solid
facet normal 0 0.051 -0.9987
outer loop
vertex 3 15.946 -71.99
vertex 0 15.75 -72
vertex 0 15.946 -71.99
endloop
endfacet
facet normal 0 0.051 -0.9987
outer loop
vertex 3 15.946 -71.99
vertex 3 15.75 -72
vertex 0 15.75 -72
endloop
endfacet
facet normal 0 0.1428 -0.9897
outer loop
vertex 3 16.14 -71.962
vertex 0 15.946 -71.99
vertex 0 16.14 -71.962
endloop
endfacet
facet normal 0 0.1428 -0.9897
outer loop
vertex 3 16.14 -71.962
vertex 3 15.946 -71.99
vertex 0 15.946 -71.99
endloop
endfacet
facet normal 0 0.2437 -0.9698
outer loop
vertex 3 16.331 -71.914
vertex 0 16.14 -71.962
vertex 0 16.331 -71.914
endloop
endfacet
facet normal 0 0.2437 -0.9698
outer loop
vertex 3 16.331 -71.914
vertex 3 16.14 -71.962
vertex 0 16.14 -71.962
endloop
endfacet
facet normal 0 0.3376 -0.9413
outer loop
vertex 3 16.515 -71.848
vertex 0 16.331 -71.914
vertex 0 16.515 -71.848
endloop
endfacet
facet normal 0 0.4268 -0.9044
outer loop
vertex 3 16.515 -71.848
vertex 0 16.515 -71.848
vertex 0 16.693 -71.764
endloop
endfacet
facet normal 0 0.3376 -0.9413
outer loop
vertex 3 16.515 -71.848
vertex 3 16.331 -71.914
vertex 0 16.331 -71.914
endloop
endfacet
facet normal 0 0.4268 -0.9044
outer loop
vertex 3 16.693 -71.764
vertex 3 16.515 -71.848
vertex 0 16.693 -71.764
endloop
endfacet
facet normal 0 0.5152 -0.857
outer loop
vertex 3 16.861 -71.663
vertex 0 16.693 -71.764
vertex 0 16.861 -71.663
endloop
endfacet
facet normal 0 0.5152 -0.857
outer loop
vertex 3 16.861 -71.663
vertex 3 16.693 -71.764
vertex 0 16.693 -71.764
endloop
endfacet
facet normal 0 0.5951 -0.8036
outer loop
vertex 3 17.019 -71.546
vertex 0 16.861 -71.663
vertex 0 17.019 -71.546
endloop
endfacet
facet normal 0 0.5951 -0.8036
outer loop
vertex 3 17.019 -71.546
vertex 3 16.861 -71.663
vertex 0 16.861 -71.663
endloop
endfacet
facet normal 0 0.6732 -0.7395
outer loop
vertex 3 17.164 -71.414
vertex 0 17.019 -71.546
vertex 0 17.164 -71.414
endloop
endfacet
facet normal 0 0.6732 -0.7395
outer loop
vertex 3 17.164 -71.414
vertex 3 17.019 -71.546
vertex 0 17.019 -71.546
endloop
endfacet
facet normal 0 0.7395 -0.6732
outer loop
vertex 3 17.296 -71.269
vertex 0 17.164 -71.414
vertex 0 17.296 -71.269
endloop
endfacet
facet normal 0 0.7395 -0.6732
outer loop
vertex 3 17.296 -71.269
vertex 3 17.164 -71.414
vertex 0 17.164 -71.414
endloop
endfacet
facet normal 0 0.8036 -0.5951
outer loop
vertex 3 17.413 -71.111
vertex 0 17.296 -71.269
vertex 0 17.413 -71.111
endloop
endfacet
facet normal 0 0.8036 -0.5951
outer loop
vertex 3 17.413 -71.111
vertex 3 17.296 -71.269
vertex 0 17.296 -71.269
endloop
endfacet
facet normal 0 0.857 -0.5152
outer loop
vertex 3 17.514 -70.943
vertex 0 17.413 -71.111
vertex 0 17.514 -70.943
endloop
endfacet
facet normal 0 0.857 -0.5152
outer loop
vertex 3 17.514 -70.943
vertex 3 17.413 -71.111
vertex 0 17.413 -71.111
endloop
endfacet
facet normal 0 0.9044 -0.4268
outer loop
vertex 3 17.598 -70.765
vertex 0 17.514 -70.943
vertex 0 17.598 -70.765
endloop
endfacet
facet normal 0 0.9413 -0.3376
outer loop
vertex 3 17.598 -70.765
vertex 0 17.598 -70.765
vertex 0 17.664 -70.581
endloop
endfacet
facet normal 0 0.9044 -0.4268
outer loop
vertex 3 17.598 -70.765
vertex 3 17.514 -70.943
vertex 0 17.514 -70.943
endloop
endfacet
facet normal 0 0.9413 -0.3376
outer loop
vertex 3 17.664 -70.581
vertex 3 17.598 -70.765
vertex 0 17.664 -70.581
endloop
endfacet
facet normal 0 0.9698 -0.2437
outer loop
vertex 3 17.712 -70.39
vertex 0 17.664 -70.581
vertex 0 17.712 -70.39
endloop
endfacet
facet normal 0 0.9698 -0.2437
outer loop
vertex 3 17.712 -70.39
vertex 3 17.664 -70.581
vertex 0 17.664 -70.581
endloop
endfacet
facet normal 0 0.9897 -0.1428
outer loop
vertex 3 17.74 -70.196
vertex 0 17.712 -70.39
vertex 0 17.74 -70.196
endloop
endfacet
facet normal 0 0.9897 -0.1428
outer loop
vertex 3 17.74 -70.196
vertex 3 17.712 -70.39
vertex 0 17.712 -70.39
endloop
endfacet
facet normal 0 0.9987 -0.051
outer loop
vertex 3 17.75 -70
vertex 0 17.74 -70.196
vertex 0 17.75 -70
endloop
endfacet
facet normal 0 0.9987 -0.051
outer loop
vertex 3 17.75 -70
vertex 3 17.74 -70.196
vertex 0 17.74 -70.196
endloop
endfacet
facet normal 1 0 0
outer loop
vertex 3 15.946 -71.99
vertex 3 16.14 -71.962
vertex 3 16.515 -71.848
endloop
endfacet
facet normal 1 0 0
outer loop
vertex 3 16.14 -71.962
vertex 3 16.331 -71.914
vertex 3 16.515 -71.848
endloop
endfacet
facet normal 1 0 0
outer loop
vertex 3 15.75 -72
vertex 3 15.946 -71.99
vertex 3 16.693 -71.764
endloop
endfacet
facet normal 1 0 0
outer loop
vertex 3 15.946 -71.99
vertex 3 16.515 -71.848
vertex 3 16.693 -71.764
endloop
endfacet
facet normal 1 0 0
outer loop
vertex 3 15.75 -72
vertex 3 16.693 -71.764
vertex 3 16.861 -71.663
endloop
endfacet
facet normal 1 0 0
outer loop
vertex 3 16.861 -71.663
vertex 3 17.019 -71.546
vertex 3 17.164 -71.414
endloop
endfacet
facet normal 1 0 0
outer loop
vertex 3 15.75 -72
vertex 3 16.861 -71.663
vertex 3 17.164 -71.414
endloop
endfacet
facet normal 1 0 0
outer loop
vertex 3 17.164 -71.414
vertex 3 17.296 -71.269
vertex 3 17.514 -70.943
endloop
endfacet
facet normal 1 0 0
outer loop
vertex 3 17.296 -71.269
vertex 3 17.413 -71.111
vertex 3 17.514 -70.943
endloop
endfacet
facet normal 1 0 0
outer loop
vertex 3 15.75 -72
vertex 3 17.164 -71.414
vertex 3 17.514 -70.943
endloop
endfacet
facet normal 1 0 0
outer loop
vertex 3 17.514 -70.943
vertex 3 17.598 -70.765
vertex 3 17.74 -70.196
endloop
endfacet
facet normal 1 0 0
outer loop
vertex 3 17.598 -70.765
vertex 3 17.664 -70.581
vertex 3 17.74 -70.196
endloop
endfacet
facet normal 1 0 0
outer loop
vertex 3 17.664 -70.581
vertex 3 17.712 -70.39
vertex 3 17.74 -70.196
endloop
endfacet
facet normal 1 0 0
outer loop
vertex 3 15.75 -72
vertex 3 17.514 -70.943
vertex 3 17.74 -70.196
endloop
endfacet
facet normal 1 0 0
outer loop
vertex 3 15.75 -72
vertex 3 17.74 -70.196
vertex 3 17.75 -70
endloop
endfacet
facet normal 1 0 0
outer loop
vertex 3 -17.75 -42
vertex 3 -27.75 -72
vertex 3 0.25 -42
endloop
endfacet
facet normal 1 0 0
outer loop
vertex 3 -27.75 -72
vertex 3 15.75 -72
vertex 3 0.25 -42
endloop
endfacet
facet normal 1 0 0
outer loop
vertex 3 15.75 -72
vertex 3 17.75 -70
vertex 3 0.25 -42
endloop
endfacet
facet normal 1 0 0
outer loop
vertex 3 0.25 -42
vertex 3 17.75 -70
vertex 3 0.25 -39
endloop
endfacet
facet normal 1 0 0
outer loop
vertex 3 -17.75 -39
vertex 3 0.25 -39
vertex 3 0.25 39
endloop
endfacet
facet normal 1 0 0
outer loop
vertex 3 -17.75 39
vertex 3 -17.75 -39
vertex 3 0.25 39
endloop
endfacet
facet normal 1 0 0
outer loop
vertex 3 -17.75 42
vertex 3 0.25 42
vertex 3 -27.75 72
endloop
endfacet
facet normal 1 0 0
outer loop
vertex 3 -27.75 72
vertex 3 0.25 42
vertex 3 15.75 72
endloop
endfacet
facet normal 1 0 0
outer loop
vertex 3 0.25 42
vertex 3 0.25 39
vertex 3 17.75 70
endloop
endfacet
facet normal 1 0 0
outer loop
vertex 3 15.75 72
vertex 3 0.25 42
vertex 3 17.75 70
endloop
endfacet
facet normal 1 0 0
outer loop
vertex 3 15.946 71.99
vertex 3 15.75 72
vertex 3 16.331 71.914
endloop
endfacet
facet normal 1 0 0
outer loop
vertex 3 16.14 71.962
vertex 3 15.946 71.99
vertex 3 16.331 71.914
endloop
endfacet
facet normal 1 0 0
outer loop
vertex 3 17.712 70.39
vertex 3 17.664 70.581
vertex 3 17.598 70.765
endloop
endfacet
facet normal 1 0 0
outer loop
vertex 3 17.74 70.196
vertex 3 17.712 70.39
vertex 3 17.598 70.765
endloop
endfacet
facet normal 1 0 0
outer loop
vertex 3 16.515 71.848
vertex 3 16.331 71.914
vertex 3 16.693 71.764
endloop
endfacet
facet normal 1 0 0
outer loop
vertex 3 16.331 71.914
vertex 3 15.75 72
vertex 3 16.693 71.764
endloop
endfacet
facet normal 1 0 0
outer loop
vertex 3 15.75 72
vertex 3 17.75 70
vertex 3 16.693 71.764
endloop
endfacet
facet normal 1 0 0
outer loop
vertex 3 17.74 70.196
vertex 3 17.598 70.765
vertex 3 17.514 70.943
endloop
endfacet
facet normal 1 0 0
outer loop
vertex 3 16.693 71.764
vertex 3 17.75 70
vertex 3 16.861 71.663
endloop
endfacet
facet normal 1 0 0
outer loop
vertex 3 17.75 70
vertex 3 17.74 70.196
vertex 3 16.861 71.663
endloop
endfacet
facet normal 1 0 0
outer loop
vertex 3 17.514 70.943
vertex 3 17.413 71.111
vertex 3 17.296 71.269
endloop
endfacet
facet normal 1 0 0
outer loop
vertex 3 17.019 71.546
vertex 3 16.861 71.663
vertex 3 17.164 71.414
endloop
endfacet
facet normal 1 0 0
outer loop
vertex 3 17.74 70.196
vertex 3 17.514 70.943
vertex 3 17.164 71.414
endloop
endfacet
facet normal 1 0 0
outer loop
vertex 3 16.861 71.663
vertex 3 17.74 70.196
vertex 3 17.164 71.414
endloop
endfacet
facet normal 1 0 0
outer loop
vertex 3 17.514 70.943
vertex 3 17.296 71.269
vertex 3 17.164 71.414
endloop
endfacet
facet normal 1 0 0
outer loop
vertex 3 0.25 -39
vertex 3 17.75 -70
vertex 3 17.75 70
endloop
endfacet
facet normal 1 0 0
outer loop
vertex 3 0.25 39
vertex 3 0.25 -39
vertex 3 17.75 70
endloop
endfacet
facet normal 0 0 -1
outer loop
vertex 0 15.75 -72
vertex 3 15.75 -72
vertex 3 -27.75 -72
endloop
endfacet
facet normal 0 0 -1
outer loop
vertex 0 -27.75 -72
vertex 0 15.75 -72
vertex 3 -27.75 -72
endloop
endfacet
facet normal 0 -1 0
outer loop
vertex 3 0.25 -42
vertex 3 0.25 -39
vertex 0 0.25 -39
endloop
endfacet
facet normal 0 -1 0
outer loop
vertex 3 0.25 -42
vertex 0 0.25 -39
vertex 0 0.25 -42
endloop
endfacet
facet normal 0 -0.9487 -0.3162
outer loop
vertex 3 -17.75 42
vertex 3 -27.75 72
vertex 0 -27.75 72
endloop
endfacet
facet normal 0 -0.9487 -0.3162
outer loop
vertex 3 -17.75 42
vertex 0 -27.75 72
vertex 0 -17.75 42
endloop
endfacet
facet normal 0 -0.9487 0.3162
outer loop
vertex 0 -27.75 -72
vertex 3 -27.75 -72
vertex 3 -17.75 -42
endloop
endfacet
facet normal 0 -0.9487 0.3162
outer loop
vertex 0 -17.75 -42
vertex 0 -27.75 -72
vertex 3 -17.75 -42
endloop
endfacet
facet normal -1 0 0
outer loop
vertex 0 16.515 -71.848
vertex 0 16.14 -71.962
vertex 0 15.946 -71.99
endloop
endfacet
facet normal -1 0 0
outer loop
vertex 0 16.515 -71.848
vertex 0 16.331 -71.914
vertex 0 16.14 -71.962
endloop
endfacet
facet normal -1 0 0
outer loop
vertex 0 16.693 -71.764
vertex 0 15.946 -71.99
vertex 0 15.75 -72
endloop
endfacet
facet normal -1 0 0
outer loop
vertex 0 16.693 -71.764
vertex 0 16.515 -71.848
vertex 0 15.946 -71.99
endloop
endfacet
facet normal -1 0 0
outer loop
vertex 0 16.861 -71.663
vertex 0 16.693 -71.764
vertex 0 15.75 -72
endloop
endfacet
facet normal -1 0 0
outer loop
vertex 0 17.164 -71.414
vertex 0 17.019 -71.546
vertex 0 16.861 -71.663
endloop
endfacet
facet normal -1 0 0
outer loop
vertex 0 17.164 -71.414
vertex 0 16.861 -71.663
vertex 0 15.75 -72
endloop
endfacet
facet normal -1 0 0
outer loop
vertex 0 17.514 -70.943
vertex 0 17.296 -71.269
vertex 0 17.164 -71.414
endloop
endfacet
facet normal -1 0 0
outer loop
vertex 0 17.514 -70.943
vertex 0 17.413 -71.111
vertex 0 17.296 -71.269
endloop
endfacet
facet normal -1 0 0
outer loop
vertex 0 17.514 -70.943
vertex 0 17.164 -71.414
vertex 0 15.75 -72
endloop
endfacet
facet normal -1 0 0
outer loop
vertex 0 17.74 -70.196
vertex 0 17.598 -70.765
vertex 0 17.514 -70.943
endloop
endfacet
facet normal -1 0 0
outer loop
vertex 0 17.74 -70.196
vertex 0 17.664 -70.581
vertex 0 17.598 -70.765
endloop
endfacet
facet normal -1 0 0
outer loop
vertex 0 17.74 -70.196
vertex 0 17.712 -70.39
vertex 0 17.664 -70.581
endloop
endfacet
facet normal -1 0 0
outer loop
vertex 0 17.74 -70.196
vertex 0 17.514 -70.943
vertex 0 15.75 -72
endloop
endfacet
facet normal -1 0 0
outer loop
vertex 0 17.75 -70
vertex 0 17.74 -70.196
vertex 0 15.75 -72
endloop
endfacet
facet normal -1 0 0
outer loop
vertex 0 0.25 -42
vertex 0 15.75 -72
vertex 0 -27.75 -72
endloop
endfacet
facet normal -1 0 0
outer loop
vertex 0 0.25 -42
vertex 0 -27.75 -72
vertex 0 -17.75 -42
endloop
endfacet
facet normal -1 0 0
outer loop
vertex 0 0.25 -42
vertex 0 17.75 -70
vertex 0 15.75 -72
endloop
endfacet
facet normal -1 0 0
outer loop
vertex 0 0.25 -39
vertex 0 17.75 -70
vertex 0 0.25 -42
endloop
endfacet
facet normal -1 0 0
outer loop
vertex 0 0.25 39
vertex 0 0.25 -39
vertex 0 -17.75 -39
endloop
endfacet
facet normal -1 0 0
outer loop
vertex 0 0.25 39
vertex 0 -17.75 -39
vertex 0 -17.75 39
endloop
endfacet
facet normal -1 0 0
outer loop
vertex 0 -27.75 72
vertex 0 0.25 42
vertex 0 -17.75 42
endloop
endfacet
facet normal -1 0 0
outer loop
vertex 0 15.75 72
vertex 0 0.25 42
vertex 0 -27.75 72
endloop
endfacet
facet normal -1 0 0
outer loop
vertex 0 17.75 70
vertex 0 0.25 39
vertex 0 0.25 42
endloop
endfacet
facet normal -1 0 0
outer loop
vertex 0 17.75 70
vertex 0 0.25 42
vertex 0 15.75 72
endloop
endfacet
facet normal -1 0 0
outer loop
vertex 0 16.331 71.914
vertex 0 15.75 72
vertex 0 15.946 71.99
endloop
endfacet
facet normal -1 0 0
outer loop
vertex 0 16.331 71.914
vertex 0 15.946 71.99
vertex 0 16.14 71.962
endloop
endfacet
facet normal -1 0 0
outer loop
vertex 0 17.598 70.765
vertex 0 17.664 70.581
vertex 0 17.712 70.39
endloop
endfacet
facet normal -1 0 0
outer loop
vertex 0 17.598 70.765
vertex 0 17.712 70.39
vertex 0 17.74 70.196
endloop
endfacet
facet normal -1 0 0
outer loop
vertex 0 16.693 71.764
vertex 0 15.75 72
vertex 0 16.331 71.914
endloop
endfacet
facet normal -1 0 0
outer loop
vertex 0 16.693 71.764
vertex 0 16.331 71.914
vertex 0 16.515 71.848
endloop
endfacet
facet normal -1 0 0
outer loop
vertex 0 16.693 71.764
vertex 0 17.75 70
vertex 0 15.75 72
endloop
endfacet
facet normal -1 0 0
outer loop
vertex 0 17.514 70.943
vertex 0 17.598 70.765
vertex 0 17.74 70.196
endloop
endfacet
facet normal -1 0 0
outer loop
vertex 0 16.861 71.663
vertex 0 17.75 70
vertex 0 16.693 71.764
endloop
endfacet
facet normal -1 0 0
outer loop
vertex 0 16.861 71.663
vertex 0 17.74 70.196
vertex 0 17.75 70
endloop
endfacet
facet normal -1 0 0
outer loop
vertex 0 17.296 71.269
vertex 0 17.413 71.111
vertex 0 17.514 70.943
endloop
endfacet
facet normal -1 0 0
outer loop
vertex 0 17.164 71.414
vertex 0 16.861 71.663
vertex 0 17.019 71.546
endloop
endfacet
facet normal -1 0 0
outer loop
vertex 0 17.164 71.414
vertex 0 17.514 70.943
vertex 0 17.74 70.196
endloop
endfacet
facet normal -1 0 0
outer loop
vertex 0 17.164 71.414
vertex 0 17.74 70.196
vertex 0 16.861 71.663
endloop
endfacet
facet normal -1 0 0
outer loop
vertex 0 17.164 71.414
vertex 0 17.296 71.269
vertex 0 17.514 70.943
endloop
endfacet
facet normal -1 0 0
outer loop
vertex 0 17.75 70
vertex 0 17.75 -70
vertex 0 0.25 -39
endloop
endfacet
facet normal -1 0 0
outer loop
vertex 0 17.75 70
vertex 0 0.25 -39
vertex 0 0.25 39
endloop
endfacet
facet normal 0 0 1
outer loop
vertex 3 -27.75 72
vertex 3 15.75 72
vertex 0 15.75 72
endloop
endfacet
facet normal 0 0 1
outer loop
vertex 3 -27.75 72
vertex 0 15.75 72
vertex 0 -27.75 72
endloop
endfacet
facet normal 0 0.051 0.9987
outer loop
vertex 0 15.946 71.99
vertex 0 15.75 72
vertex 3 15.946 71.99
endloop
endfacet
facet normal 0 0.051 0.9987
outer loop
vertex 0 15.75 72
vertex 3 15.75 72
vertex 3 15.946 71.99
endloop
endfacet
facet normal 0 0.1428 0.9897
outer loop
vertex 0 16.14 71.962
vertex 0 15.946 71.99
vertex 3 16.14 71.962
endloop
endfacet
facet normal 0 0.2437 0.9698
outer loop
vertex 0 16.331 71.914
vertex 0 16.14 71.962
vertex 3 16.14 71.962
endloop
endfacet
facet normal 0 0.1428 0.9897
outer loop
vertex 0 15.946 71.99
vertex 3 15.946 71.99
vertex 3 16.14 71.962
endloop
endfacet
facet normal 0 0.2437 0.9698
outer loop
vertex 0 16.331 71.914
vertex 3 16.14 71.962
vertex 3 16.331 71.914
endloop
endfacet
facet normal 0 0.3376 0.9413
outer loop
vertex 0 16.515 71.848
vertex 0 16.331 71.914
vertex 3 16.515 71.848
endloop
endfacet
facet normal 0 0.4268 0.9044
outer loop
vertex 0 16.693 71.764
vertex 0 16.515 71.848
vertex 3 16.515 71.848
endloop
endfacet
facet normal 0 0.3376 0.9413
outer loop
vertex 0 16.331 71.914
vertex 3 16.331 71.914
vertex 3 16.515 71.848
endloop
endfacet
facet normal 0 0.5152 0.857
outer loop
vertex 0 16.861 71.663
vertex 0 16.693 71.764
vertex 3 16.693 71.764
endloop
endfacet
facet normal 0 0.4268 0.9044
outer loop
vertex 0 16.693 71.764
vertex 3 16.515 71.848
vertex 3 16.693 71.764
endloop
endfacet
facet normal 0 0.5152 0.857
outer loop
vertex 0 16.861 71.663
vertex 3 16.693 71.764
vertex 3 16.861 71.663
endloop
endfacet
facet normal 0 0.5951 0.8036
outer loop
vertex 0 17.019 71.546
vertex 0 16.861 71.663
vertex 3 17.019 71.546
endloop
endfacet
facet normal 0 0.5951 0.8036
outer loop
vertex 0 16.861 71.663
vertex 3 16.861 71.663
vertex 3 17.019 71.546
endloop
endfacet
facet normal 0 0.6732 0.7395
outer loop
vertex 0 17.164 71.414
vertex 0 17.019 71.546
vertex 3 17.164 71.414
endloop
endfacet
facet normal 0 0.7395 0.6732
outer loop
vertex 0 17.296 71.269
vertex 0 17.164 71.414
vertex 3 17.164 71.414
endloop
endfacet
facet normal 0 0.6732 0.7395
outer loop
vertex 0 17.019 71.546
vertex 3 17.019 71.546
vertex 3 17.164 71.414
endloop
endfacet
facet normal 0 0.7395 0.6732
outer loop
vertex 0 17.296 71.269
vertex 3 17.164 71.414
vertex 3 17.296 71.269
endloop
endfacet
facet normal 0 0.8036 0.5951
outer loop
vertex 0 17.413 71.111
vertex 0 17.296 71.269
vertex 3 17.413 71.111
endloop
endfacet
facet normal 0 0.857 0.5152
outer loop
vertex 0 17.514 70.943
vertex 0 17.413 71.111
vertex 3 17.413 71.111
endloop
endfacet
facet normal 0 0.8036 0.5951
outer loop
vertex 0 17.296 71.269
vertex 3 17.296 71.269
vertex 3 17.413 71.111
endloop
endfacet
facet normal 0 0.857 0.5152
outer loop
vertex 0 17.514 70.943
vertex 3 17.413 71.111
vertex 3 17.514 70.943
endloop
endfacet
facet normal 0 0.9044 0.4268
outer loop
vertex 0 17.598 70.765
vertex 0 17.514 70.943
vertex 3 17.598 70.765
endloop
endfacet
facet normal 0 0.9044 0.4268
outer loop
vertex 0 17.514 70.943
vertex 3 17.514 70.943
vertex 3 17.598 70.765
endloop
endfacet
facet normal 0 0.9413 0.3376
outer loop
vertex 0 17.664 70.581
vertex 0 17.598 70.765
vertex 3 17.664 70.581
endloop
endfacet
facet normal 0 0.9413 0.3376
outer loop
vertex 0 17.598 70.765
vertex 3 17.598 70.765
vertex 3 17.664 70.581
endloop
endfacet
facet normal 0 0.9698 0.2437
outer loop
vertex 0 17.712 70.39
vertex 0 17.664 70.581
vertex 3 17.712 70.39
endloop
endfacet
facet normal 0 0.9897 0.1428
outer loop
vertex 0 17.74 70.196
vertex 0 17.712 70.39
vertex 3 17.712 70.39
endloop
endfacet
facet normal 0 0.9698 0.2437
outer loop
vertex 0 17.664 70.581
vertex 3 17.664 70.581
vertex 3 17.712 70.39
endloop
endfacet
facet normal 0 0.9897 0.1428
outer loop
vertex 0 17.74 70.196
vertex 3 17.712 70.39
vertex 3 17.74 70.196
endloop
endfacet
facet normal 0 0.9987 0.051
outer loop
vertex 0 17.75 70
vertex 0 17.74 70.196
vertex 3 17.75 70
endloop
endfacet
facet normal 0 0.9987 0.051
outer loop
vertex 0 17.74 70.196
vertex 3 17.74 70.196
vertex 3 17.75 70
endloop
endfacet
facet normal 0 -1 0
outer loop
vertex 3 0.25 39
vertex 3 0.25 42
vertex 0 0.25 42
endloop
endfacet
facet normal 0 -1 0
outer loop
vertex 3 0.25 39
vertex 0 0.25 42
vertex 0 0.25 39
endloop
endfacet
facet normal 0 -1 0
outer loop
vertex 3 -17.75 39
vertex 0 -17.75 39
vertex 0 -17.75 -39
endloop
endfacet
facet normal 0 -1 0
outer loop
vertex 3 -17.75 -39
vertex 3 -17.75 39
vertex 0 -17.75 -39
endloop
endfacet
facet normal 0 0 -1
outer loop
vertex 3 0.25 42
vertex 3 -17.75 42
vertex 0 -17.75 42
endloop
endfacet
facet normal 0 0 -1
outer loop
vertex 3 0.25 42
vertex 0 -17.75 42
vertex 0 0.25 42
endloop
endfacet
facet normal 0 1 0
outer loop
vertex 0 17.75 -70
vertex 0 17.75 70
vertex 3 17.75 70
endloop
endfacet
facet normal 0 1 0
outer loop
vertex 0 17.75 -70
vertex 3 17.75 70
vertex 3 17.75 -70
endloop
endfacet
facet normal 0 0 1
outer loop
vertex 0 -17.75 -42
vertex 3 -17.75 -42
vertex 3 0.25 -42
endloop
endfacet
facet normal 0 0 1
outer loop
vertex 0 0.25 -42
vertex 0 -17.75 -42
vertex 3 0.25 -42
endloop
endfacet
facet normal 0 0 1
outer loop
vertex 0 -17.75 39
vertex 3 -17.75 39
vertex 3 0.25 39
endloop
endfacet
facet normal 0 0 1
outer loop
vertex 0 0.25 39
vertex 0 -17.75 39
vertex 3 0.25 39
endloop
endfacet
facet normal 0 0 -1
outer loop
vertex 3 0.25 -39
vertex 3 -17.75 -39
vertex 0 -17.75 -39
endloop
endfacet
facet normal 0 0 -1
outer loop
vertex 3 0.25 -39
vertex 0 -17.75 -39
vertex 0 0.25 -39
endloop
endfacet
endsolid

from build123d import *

# Parameters (mm, degrees)
SKETCH1_W           = 144
SKETCH1_H           = 35.5
BOSS_EXTRUDE1_DEPTH = 3
FILLET1_R           = 2
SKETCH2_W           = 3
SKETCH2_H           = 18
CUT_EXTRUDE1_DEPTH  = 3
BOSS_EXTRUDE2_DEPTH = 3


with BuildPart() as part:
    # Sketch1 → Boss-Extrude1 (new body)
    with BuildSketch(Plane(origin=(0, 0, 0), x_dir=(0, 0, -1), z_dir=(1, 0, 0))):
        Rectangle(SKETCH1_W, SKETCH1_H)
    extrude(amount=BOSS_EXTRUDE1_DEPTH)

    # Fillet1
    fillet1_edges = [part.edges().sort_by_distance(p)[0] for p in [
        (1.5, 17.75, 72),
        (1.5, 17.75, -72),
    ]]
    fillet(fillet1_edges, radius=FILLET1_R)

    # Sketch2 → Cut-Extrude1 (cut)
    with BuildSketch(Plane(origin=(3, 0, 0), x_dir=(0, 0, -1), z_dir=(1, 0, 0))):
        with Locations((-40.5, -8.75)):
            Rectangle(SKETCH2_W, SKETCH2_H)
        with Locations((40.5, -8.75)):
            Rectangle(SKETCH2_W, SKETCH2_H)
    extrude(amount=-CUT_EXTRUDE1_DEPTH, mode=Mode.SUBTRACT)

    # Sketch3 → Boss-Extrude2 (add)
    with BuildSketch(Plane(origin=(3, 0, 0), x_dir=(0, 0, -1), z_dir=(1, 0, 0))):
        Polygon((-72, -17.75), (-72, -27.75), (-42, -17.75), align=None)
    boss_extrude2 = extrude(amount=-BOSS_EXTRUDE2_DEPTH)

    # Mirror1: Boss-Extrude2 across plane
    add(boss_extrude2.mirror(Plane.XY))


solid = part.part
